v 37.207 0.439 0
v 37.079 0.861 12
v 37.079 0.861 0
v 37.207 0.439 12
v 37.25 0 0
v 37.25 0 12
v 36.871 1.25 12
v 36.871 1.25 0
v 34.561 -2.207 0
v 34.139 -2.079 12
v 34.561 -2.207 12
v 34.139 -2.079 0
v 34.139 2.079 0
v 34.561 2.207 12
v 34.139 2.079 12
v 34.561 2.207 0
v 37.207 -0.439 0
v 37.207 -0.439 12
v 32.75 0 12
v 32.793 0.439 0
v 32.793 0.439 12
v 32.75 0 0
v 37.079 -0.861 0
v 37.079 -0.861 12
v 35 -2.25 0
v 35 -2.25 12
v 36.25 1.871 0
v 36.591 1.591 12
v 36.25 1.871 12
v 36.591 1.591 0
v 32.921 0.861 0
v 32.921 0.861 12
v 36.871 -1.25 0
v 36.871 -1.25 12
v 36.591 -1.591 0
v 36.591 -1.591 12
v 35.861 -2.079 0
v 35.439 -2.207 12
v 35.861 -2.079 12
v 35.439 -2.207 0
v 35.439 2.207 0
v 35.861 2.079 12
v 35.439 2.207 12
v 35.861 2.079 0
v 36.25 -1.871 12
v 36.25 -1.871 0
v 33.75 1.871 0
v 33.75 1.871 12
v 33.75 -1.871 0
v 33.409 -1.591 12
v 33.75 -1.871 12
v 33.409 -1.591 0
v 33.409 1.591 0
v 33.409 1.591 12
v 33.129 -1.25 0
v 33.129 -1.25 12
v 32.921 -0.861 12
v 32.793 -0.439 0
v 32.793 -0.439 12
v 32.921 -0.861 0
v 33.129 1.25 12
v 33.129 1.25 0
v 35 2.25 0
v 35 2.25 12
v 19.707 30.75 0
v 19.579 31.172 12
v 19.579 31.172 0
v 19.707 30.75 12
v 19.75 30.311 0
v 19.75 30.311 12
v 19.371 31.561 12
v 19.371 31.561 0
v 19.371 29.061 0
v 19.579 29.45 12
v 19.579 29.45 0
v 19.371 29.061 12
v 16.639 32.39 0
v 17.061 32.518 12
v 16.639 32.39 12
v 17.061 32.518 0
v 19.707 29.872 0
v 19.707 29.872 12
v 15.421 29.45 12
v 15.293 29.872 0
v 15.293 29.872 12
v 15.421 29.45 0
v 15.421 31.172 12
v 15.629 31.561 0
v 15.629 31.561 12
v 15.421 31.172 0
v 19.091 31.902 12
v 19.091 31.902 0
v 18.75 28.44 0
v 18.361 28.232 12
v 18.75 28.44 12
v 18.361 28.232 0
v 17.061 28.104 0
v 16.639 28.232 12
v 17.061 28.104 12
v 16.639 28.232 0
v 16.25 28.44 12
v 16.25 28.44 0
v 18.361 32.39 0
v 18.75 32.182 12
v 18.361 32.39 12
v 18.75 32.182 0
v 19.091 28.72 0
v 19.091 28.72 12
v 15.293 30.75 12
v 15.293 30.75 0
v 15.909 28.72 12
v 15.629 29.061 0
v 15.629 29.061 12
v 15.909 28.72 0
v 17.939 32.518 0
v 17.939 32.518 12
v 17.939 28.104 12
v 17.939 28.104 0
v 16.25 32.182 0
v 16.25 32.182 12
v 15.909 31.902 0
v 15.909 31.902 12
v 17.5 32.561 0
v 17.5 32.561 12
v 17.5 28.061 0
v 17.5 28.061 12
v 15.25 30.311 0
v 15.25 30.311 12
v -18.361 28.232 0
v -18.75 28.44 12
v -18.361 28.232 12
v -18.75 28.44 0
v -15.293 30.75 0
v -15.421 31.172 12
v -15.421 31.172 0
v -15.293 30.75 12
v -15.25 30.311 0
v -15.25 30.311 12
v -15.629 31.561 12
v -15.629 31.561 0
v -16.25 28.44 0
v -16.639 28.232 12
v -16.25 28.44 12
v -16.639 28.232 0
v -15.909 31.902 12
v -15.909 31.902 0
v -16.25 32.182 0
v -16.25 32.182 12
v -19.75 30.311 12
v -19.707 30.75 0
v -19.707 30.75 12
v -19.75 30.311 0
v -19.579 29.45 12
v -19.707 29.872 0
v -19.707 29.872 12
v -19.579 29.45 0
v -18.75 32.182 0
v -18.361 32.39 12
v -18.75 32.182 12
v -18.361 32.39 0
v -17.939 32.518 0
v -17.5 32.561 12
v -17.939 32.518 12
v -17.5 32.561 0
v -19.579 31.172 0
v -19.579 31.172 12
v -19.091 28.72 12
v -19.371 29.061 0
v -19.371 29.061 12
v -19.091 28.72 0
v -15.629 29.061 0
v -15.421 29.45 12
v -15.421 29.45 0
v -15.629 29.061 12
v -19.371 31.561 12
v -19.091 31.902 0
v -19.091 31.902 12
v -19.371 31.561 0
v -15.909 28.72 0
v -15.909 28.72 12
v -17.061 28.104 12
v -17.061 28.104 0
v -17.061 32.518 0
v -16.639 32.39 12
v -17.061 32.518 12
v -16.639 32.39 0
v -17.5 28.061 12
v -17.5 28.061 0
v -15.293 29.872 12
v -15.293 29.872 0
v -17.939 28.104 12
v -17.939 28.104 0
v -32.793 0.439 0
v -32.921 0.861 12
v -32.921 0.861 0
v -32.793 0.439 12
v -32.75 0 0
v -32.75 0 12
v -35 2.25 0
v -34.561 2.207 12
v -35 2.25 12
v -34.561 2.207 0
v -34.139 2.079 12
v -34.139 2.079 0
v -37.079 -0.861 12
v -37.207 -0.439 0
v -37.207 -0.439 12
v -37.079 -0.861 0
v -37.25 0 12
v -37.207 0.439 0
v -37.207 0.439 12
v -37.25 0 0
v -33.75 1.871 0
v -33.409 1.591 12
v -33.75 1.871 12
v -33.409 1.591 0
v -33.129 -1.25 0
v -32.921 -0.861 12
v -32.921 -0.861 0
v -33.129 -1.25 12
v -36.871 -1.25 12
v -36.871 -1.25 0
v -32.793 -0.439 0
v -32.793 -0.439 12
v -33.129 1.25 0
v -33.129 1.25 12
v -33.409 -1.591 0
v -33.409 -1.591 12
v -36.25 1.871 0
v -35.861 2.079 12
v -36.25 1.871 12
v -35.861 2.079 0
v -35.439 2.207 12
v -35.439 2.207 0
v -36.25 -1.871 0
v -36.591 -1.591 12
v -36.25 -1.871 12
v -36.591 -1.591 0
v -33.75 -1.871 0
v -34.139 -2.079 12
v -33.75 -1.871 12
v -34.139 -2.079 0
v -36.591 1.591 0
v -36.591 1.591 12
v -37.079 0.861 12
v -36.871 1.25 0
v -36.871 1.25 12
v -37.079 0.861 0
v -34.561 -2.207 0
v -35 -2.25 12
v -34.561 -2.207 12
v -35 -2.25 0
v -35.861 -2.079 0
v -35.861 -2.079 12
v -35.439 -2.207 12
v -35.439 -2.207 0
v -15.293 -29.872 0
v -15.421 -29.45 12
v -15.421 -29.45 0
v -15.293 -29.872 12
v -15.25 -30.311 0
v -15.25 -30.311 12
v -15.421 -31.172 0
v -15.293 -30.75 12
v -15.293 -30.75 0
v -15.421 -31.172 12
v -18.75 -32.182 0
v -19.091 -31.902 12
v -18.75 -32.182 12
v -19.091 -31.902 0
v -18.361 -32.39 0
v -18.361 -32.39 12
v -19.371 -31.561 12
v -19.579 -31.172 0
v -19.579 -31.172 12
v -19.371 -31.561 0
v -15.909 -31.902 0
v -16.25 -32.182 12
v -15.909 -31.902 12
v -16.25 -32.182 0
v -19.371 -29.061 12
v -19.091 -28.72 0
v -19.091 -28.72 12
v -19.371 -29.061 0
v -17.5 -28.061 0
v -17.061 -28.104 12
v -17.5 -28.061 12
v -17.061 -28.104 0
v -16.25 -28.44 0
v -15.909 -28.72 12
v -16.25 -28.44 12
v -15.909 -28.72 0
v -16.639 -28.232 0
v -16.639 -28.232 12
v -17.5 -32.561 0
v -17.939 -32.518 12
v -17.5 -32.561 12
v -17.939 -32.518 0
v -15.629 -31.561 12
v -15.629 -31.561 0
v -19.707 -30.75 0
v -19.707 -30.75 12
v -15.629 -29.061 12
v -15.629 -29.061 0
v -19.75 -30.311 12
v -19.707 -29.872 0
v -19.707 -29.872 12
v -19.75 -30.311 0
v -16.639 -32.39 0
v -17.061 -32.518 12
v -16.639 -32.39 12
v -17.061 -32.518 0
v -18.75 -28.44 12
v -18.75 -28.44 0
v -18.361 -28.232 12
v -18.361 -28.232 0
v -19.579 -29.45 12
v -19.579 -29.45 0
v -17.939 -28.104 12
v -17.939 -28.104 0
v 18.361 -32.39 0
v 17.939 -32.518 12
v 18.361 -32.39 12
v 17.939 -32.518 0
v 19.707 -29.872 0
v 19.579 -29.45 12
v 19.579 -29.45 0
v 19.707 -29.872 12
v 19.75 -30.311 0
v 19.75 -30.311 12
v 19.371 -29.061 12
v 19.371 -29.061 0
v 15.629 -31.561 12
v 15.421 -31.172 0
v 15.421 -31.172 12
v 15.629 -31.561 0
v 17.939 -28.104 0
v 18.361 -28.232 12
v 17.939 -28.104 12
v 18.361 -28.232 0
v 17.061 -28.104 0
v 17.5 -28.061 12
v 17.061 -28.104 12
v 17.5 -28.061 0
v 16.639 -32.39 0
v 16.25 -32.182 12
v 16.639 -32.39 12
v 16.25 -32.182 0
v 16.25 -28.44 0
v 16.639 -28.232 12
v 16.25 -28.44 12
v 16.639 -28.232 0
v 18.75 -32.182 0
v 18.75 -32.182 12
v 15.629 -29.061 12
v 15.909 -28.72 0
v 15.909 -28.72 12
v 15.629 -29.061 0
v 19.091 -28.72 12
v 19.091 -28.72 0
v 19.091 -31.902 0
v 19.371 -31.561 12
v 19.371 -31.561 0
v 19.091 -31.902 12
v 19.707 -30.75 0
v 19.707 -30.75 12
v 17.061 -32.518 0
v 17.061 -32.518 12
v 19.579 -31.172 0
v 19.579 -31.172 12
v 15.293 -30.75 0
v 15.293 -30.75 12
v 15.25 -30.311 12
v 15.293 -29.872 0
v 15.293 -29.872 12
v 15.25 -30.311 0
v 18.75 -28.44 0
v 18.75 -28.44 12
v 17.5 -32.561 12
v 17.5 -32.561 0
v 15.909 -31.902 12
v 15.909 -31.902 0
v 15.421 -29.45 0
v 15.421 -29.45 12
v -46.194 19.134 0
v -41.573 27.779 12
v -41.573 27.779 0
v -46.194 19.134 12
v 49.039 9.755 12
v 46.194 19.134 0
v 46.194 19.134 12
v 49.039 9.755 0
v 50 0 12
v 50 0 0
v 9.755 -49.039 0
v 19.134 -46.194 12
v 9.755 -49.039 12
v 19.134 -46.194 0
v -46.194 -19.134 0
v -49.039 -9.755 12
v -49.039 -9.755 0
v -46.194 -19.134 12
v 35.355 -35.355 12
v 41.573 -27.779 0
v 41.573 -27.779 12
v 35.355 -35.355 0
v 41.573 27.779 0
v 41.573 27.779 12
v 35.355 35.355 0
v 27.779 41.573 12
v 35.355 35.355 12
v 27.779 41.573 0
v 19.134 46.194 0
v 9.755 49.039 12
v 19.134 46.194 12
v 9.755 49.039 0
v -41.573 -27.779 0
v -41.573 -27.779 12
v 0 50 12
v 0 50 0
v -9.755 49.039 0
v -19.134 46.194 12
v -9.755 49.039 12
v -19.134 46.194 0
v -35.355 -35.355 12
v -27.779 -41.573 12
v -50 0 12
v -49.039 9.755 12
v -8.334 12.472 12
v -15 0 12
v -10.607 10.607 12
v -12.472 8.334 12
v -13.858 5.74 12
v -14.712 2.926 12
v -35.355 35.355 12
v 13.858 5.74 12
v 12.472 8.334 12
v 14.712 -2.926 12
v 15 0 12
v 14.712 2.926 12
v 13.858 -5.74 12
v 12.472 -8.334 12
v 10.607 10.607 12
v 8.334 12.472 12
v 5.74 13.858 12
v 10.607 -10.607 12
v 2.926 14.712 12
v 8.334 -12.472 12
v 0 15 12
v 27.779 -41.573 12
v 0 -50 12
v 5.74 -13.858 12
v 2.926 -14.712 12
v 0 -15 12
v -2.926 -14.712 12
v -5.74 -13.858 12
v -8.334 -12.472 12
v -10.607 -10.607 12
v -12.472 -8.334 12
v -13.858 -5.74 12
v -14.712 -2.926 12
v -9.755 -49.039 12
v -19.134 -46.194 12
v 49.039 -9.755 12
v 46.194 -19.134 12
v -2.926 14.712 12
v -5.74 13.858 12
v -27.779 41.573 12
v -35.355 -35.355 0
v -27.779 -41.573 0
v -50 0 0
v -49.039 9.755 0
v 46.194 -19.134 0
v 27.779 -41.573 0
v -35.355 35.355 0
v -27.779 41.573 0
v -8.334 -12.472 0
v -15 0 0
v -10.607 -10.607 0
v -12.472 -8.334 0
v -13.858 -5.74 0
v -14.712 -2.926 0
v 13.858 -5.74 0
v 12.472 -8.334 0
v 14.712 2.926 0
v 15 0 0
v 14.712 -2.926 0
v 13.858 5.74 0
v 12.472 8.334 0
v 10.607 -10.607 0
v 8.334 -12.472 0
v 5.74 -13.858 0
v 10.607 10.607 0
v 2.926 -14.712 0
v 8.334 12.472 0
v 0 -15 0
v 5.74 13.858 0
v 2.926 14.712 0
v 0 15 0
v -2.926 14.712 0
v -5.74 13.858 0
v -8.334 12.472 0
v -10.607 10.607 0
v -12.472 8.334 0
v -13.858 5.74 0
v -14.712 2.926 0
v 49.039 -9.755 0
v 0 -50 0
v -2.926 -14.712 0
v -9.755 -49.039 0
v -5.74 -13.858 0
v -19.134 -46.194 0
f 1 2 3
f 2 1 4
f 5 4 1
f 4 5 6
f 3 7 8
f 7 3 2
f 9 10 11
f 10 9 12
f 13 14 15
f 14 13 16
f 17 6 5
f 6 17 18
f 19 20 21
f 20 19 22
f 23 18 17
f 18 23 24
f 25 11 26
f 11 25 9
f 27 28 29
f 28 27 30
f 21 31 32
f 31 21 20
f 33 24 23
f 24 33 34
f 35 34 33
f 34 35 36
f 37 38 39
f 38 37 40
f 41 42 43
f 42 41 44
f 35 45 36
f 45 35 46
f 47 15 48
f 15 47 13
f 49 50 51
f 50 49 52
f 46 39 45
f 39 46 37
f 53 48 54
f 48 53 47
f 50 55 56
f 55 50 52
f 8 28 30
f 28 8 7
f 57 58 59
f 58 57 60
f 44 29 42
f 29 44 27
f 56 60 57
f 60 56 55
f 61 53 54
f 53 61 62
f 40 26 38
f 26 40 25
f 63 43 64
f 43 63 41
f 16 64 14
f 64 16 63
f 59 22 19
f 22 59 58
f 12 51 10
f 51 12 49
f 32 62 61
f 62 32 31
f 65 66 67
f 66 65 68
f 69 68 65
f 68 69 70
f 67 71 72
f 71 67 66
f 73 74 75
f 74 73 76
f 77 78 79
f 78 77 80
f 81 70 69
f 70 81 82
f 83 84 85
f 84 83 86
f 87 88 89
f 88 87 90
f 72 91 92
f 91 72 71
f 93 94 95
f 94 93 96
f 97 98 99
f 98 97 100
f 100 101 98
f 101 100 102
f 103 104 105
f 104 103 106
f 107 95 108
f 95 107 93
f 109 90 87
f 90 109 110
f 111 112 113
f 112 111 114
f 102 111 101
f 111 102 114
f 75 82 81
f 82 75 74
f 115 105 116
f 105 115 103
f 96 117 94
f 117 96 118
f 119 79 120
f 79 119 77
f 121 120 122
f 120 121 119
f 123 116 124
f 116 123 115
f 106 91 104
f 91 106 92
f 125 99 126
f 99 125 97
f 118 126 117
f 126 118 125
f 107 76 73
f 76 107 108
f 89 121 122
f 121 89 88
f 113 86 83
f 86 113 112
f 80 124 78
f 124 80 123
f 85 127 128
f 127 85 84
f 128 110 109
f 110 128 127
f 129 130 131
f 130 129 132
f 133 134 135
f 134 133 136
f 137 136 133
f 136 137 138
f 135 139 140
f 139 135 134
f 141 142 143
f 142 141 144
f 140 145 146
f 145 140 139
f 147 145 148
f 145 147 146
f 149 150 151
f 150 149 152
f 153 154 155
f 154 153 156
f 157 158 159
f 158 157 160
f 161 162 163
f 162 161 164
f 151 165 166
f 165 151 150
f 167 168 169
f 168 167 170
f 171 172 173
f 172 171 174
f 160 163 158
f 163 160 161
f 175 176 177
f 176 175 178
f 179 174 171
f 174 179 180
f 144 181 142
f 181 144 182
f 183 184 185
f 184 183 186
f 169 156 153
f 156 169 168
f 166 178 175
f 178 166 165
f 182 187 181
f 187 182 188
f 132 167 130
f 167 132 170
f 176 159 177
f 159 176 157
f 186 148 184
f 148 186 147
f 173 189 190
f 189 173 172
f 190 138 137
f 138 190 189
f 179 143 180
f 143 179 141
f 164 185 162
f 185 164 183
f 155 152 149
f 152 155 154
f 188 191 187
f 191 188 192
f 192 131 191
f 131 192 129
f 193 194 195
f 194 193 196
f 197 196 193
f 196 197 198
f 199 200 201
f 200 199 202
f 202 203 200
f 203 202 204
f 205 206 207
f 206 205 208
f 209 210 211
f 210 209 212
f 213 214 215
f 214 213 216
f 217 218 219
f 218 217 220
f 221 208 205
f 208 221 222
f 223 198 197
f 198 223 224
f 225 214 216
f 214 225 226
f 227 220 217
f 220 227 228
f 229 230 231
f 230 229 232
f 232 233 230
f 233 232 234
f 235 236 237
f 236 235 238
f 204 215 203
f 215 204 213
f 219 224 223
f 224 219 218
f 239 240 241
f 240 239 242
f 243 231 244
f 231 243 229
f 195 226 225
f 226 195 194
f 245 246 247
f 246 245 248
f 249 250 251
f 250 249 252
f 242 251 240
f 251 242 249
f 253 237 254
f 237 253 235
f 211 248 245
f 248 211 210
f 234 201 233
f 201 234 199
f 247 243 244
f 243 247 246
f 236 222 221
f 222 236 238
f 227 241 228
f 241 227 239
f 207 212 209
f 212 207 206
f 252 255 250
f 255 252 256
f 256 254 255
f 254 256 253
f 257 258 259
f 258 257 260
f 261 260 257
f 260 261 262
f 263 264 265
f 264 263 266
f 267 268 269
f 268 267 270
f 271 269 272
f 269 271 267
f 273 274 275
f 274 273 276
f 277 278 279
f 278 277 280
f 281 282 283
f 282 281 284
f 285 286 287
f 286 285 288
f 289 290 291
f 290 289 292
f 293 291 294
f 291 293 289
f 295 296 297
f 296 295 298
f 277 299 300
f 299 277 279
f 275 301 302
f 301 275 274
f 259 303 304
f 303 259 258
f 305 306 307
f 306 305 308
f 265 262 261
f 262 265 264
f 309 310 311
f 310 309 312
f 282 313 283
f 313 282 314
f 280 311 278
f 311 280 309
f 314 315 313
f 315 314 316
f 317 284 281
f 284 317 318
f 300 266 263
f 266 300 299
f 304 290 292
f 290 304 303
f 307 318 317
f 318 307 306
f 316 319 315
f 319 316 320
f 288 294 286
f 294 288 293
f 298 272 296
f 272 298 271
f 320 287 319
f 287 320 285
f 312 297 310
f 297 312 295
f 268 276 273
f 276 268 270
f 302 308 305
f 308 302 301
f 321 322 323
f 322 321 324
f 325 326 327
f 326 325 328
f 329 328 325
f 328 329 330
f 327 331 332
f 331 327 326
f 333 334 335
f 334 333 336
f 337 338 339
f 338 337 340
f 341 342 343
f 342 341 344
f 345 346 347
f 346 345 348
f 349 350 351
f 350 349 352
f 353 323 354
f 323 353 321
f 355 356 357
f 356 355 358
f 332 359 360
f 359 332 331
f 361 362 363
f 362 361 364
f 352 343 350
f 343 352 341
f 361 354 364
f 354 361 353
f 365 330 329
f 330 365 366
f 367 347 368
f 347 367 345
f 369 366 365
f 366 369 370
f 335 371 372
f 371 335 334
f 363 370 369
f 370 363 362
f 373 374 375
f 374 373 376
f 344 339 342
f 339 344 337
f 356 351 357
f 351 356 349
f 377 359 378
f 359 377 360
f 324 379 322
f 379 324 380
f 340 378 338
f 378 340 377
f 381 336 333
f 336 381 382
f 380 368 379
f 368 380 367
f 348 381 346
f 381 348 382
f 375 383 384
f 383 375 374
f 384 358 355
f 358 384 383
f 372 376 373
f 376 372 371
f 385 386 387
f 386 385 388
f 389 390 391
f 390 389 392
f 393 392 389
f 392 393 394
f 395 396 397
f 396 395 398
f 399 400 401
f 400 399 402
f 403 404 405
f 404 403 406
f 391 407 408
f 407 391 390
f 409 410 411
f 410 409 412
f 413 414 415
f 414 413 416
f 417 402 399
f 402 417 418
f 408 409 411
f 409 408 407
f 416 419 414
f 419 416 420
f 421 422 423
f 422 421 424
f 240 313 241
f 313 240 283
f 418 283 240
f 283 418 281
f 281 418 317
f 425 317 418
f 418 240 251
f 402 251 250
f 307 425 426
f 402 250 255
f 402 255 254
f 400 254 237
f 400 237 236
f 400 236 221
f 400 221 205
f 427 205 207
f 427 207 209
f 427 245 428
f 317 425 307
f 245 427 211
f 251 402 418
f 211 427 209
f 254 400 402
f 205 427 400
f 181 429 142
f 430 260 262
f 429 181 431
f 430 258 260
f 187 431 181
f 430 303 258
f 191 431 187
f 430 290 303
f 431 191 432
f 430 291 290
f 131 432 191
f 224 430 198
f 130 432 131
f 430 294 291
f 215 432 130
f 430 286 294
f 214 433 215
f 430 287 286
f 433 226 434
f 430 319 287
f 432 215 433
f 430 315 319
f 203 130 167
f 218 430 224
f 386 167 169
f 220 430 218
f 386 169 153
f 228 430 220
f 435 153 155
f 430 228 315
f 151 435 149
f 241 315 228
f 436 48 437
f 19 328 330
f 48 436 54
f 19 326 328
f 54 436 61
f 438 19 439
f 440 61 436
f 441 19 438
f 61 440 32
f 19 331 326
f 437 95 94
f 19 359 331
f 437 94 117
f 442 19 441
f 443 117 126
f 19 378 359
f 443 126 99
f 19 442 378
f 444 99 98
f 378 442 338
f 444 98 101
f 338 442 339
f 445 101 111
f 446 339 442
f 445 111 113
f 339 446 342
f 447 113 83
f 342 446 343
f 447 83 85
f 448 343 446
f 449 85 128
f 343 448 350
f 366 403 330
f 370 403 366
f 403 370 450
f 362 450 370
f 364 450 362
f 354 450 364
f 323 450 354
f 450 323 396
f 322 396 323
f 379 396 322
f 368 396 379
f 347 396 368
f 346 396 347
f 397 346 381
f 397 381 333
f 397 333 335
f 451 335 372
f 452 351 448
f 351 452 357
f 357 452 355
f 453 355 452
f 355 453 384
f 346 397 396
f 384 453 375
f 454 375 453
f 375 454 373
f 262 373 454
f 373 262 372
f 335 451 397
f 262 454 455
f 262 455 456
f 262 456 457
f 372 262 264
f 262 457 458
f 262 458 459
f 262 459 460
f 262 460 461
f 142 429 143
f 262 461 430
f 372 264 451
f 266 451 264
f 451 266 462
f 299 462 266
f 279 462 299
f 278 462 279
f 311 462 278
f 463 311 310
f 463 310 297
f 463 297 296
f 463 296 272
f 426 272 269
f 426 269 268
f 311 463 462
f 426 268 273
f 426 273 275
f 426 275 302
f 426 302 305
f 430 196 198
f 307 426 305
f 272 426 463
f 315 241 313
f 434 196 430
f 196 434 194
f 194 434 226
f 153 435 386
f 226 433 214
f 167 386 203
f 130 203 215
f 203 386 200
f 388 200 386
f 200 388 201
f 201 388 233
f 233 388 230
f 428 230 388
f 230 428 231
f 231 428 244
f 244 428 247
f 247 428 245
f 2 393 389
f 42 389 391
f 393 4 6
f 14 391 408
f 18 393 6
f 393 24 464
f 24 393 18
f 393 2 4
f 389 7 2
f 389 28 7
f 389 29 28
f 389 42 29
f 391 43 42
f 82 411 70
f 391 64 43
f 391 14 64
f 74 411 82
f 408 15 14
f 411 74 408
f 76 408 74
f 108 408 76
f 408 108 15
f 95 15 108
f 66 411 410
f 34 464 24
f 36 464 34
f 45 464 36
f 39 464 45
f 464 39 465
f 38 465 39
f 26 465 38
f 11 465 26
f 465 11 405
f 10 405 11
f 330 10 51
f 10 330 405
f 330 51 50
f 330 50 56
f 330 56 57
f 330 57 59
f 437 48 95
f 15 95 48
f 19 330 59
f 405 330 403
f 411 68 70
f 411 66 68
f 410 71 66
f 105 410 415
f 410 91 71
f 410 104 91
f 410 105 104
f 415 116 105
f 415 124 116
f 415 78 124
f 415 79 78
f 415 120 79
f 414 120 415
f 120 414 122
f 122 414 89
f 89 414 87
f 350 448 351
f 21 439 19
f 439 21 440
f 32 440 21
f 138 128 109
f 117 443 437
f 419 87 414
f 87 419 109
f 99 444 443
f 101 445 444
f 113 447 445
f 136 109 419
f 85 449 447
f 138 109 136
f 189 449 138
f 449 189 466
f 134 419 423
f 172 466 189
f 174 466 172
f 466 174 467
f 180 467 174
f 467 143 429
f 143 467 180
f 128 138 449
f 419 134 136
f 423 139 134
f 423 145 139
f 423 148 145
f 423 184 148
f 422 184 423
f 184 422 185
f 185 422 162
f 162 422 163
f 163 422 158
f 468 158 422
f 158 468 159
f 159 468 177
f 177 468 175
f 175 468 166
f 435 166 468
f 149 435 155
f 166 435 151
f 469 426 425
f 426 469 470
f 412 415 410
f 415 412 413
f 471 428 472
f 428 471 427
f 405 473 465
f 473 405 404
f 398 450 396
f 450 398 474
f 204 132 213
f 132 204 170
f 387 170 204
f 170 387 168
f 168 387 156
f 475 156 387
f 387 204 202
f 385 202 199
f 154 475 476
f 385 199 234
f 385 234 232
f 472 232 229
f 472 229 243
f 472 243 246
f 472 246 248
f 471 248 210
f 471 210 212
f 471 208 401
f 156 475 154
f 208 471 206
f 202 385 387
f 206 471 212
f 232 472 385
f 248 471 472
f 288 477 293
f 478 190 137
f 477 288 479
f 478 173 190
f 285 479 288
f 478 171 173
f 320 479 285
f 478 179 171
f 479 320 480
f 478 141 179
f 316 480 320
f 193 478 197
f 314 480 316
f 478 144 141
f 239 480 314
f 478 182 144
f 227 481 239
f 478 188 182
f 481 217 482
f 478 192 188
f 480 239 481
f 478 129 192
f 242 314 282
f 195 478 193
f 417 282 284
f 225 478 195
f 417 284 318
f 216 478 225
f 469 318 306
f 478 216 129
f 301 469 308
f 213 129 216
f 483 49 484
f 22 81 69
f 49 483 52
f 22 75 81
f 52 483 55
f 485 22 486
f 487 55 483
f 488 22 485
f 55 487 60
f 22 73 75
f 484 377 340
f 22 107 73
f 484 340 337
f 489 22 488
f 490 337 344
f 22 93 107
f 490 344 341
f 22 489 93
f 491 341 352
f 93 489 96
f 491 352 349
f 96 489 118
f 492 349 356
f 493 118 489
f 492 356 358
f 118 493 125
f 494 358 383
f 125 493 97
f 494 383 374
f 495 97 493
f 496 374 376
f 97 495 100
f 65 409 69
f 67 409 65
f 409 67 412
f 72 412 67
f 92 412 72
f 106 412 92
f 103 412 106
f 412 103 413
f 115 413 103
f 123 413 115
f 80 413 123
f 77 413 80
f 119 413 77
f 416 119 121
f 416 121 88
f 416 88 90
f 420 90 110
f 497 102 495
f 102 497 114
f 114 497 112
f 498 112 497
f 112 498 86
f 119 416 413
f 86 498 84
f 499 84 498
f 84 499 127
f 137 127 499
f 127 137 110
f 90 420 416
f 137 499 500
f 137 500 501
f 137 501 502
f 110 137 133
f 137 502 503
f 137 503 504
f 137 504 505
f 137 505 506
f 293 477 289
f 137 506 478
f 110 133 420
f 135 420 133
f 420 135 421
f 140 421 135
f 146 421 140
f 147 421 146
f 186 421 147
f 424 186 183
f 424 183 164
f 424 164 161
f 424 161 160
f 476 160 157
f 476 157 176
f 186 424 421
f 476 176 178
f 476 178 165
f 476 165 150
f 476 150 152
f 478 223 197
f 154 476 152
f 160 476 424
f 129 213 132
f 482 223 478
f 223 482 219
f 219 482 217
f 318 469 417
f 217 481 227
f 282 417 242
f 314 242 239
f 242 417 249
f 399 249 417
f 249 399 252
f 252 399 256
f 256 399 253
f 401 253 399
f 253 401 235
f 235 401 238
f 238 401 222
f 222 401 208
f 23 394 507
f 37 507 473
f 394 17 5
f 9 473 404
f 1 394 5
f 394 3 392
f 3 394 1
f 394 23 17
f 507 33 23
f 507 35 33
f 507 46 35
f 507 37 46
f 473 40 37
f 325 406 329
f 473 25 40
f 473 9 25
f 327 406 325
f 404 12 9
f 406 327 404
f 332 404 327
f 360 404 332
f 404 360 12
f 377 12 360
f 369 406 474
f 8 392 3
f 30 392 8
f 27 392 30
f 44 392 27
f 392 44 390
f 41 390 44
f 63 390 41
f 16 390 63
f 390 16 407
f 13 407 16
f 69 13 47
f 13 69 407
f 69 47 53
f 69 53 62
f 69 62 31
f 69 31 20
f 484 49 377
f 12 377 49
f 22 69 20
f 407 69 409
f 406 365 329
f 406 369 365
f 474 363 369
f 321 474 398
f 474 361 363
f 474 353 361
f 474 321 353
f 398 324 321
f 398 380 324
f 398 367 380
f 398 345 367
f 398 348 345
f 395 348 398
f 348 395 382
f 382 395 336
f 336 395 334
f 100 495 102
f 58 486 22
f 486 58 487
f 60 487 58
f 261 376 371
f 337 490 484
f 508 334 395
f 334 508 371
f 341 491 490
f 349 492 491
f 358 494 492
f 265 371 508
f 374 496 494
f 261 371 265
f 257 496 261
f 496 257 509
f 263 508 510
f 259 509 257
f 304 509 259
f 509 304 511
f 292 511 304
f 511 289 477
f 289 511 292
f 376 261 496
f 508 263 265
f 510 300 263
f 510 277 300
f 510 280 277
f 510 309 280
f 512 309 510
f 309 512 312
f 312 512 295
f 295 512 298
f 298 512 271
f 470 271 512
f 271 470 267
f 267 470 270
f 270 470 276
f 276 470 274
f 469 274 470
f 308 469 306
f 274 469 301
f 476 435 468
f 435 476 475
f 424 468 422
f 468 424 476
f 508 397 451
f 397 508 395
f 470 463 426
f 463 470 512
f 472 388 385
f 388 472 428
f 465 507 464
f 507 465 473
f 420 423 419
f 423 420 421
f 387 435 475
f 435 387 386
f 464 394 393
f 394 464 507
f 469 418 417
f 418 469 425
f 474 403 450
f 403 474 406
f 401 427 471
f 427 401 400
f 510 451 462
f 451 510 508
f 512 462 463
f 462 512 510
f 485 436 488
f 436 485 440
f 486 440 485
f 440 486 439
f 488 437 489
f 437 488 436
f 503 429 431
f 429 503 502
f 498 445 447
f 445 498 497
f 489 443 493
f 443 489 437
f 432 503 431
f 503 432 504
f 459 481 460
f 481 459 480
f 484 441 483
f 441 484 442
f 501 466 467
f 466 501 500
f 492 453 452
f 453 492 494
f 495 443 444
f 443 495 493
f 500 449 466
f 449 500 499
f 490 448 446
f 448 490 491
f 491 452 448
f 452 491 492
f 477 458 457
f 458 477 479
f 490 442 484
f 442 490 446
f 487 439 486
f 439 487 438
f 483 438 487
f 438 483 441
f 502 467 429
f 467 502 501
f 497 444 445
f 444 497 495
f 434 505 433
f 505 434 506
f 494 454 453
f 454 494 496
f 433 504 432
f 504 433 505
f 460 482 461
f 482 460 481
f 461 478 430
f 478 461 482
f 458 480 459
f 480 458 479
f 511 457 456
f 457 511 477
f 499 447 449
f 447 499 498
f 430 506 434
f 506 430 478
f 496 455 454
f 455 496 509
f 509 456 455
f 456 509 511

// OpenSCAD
$fn = 32;

// ----------------------------------------------------------------------
// Flange Ø100 x 12
// 6 holes on a Ø70 bolt circle, bolted joints
// ----------------------------------------------------------------------

// --- parameters (mm) ---
flange_d = 100;  // outside diameter of the flange
thickness = 12;  // flange thickness
holes = 6;       // number of bolt holes
pcd = 70;        // bolt circle diameter
start_deg = 0;   // angle of the first hole, from +X
hole_d = 4.5;    // bolt hole diameter
bore_d = 30;     // central through bore
hub_d = 40;      // hub outside diameter
hub_h = 0;       // hub height above the flange face (0 = no hub)

// --- derived feature positions (mm) ---
height = thickness + hub_h;  // = 12   overall height of the part
pcd_r = pcd / 2;             // = 35   bolt circle radius
hole_step = 360 / holes;     // = 60   angular pitch
feature_centers = [
  [pcd_r * cos(start_deg + 0 * hole_step), pcd_r * sin(start_deg + 0 * hole_step)],
  [pcd_r * cos(start_deg + 1 * hole_step), pcd_r * sin(start_deg + 1 * hole_step)],
  [pcd_r * cos(start_deg + 2 * hole_step), pcd_r * sin(start_deg + 2 * hole_step)],
  [pcd_r * cos(start_deg + 3 * hole_step), pcd_r * sin(start_deg + 3 * hole_step)],
  [pcd_r * cos(start_deg + 4 * hole_step), pcd_r * sin(start_deg + 4 * hole_step)],
  [pcd_r * cos(start_deg + 5 * hole_step), pcd_r * sin(start_deg + 5 * hole_step)]
];   // bolt hole centres on the pitch circle

// flange disc, every hole and the bore cut straight through
difference() {
  union() {
    cylinder(d = flange_d, h = thickness);
  }
  translate([0, 0, -1]) cylinder(d = bore_d, h = height + 2);  // bore, through
  for (centre = feature_centers)
    translate([centre[0], centre[1], -1]) cylinder(d = hole_d, h = thickness + 2);
}
